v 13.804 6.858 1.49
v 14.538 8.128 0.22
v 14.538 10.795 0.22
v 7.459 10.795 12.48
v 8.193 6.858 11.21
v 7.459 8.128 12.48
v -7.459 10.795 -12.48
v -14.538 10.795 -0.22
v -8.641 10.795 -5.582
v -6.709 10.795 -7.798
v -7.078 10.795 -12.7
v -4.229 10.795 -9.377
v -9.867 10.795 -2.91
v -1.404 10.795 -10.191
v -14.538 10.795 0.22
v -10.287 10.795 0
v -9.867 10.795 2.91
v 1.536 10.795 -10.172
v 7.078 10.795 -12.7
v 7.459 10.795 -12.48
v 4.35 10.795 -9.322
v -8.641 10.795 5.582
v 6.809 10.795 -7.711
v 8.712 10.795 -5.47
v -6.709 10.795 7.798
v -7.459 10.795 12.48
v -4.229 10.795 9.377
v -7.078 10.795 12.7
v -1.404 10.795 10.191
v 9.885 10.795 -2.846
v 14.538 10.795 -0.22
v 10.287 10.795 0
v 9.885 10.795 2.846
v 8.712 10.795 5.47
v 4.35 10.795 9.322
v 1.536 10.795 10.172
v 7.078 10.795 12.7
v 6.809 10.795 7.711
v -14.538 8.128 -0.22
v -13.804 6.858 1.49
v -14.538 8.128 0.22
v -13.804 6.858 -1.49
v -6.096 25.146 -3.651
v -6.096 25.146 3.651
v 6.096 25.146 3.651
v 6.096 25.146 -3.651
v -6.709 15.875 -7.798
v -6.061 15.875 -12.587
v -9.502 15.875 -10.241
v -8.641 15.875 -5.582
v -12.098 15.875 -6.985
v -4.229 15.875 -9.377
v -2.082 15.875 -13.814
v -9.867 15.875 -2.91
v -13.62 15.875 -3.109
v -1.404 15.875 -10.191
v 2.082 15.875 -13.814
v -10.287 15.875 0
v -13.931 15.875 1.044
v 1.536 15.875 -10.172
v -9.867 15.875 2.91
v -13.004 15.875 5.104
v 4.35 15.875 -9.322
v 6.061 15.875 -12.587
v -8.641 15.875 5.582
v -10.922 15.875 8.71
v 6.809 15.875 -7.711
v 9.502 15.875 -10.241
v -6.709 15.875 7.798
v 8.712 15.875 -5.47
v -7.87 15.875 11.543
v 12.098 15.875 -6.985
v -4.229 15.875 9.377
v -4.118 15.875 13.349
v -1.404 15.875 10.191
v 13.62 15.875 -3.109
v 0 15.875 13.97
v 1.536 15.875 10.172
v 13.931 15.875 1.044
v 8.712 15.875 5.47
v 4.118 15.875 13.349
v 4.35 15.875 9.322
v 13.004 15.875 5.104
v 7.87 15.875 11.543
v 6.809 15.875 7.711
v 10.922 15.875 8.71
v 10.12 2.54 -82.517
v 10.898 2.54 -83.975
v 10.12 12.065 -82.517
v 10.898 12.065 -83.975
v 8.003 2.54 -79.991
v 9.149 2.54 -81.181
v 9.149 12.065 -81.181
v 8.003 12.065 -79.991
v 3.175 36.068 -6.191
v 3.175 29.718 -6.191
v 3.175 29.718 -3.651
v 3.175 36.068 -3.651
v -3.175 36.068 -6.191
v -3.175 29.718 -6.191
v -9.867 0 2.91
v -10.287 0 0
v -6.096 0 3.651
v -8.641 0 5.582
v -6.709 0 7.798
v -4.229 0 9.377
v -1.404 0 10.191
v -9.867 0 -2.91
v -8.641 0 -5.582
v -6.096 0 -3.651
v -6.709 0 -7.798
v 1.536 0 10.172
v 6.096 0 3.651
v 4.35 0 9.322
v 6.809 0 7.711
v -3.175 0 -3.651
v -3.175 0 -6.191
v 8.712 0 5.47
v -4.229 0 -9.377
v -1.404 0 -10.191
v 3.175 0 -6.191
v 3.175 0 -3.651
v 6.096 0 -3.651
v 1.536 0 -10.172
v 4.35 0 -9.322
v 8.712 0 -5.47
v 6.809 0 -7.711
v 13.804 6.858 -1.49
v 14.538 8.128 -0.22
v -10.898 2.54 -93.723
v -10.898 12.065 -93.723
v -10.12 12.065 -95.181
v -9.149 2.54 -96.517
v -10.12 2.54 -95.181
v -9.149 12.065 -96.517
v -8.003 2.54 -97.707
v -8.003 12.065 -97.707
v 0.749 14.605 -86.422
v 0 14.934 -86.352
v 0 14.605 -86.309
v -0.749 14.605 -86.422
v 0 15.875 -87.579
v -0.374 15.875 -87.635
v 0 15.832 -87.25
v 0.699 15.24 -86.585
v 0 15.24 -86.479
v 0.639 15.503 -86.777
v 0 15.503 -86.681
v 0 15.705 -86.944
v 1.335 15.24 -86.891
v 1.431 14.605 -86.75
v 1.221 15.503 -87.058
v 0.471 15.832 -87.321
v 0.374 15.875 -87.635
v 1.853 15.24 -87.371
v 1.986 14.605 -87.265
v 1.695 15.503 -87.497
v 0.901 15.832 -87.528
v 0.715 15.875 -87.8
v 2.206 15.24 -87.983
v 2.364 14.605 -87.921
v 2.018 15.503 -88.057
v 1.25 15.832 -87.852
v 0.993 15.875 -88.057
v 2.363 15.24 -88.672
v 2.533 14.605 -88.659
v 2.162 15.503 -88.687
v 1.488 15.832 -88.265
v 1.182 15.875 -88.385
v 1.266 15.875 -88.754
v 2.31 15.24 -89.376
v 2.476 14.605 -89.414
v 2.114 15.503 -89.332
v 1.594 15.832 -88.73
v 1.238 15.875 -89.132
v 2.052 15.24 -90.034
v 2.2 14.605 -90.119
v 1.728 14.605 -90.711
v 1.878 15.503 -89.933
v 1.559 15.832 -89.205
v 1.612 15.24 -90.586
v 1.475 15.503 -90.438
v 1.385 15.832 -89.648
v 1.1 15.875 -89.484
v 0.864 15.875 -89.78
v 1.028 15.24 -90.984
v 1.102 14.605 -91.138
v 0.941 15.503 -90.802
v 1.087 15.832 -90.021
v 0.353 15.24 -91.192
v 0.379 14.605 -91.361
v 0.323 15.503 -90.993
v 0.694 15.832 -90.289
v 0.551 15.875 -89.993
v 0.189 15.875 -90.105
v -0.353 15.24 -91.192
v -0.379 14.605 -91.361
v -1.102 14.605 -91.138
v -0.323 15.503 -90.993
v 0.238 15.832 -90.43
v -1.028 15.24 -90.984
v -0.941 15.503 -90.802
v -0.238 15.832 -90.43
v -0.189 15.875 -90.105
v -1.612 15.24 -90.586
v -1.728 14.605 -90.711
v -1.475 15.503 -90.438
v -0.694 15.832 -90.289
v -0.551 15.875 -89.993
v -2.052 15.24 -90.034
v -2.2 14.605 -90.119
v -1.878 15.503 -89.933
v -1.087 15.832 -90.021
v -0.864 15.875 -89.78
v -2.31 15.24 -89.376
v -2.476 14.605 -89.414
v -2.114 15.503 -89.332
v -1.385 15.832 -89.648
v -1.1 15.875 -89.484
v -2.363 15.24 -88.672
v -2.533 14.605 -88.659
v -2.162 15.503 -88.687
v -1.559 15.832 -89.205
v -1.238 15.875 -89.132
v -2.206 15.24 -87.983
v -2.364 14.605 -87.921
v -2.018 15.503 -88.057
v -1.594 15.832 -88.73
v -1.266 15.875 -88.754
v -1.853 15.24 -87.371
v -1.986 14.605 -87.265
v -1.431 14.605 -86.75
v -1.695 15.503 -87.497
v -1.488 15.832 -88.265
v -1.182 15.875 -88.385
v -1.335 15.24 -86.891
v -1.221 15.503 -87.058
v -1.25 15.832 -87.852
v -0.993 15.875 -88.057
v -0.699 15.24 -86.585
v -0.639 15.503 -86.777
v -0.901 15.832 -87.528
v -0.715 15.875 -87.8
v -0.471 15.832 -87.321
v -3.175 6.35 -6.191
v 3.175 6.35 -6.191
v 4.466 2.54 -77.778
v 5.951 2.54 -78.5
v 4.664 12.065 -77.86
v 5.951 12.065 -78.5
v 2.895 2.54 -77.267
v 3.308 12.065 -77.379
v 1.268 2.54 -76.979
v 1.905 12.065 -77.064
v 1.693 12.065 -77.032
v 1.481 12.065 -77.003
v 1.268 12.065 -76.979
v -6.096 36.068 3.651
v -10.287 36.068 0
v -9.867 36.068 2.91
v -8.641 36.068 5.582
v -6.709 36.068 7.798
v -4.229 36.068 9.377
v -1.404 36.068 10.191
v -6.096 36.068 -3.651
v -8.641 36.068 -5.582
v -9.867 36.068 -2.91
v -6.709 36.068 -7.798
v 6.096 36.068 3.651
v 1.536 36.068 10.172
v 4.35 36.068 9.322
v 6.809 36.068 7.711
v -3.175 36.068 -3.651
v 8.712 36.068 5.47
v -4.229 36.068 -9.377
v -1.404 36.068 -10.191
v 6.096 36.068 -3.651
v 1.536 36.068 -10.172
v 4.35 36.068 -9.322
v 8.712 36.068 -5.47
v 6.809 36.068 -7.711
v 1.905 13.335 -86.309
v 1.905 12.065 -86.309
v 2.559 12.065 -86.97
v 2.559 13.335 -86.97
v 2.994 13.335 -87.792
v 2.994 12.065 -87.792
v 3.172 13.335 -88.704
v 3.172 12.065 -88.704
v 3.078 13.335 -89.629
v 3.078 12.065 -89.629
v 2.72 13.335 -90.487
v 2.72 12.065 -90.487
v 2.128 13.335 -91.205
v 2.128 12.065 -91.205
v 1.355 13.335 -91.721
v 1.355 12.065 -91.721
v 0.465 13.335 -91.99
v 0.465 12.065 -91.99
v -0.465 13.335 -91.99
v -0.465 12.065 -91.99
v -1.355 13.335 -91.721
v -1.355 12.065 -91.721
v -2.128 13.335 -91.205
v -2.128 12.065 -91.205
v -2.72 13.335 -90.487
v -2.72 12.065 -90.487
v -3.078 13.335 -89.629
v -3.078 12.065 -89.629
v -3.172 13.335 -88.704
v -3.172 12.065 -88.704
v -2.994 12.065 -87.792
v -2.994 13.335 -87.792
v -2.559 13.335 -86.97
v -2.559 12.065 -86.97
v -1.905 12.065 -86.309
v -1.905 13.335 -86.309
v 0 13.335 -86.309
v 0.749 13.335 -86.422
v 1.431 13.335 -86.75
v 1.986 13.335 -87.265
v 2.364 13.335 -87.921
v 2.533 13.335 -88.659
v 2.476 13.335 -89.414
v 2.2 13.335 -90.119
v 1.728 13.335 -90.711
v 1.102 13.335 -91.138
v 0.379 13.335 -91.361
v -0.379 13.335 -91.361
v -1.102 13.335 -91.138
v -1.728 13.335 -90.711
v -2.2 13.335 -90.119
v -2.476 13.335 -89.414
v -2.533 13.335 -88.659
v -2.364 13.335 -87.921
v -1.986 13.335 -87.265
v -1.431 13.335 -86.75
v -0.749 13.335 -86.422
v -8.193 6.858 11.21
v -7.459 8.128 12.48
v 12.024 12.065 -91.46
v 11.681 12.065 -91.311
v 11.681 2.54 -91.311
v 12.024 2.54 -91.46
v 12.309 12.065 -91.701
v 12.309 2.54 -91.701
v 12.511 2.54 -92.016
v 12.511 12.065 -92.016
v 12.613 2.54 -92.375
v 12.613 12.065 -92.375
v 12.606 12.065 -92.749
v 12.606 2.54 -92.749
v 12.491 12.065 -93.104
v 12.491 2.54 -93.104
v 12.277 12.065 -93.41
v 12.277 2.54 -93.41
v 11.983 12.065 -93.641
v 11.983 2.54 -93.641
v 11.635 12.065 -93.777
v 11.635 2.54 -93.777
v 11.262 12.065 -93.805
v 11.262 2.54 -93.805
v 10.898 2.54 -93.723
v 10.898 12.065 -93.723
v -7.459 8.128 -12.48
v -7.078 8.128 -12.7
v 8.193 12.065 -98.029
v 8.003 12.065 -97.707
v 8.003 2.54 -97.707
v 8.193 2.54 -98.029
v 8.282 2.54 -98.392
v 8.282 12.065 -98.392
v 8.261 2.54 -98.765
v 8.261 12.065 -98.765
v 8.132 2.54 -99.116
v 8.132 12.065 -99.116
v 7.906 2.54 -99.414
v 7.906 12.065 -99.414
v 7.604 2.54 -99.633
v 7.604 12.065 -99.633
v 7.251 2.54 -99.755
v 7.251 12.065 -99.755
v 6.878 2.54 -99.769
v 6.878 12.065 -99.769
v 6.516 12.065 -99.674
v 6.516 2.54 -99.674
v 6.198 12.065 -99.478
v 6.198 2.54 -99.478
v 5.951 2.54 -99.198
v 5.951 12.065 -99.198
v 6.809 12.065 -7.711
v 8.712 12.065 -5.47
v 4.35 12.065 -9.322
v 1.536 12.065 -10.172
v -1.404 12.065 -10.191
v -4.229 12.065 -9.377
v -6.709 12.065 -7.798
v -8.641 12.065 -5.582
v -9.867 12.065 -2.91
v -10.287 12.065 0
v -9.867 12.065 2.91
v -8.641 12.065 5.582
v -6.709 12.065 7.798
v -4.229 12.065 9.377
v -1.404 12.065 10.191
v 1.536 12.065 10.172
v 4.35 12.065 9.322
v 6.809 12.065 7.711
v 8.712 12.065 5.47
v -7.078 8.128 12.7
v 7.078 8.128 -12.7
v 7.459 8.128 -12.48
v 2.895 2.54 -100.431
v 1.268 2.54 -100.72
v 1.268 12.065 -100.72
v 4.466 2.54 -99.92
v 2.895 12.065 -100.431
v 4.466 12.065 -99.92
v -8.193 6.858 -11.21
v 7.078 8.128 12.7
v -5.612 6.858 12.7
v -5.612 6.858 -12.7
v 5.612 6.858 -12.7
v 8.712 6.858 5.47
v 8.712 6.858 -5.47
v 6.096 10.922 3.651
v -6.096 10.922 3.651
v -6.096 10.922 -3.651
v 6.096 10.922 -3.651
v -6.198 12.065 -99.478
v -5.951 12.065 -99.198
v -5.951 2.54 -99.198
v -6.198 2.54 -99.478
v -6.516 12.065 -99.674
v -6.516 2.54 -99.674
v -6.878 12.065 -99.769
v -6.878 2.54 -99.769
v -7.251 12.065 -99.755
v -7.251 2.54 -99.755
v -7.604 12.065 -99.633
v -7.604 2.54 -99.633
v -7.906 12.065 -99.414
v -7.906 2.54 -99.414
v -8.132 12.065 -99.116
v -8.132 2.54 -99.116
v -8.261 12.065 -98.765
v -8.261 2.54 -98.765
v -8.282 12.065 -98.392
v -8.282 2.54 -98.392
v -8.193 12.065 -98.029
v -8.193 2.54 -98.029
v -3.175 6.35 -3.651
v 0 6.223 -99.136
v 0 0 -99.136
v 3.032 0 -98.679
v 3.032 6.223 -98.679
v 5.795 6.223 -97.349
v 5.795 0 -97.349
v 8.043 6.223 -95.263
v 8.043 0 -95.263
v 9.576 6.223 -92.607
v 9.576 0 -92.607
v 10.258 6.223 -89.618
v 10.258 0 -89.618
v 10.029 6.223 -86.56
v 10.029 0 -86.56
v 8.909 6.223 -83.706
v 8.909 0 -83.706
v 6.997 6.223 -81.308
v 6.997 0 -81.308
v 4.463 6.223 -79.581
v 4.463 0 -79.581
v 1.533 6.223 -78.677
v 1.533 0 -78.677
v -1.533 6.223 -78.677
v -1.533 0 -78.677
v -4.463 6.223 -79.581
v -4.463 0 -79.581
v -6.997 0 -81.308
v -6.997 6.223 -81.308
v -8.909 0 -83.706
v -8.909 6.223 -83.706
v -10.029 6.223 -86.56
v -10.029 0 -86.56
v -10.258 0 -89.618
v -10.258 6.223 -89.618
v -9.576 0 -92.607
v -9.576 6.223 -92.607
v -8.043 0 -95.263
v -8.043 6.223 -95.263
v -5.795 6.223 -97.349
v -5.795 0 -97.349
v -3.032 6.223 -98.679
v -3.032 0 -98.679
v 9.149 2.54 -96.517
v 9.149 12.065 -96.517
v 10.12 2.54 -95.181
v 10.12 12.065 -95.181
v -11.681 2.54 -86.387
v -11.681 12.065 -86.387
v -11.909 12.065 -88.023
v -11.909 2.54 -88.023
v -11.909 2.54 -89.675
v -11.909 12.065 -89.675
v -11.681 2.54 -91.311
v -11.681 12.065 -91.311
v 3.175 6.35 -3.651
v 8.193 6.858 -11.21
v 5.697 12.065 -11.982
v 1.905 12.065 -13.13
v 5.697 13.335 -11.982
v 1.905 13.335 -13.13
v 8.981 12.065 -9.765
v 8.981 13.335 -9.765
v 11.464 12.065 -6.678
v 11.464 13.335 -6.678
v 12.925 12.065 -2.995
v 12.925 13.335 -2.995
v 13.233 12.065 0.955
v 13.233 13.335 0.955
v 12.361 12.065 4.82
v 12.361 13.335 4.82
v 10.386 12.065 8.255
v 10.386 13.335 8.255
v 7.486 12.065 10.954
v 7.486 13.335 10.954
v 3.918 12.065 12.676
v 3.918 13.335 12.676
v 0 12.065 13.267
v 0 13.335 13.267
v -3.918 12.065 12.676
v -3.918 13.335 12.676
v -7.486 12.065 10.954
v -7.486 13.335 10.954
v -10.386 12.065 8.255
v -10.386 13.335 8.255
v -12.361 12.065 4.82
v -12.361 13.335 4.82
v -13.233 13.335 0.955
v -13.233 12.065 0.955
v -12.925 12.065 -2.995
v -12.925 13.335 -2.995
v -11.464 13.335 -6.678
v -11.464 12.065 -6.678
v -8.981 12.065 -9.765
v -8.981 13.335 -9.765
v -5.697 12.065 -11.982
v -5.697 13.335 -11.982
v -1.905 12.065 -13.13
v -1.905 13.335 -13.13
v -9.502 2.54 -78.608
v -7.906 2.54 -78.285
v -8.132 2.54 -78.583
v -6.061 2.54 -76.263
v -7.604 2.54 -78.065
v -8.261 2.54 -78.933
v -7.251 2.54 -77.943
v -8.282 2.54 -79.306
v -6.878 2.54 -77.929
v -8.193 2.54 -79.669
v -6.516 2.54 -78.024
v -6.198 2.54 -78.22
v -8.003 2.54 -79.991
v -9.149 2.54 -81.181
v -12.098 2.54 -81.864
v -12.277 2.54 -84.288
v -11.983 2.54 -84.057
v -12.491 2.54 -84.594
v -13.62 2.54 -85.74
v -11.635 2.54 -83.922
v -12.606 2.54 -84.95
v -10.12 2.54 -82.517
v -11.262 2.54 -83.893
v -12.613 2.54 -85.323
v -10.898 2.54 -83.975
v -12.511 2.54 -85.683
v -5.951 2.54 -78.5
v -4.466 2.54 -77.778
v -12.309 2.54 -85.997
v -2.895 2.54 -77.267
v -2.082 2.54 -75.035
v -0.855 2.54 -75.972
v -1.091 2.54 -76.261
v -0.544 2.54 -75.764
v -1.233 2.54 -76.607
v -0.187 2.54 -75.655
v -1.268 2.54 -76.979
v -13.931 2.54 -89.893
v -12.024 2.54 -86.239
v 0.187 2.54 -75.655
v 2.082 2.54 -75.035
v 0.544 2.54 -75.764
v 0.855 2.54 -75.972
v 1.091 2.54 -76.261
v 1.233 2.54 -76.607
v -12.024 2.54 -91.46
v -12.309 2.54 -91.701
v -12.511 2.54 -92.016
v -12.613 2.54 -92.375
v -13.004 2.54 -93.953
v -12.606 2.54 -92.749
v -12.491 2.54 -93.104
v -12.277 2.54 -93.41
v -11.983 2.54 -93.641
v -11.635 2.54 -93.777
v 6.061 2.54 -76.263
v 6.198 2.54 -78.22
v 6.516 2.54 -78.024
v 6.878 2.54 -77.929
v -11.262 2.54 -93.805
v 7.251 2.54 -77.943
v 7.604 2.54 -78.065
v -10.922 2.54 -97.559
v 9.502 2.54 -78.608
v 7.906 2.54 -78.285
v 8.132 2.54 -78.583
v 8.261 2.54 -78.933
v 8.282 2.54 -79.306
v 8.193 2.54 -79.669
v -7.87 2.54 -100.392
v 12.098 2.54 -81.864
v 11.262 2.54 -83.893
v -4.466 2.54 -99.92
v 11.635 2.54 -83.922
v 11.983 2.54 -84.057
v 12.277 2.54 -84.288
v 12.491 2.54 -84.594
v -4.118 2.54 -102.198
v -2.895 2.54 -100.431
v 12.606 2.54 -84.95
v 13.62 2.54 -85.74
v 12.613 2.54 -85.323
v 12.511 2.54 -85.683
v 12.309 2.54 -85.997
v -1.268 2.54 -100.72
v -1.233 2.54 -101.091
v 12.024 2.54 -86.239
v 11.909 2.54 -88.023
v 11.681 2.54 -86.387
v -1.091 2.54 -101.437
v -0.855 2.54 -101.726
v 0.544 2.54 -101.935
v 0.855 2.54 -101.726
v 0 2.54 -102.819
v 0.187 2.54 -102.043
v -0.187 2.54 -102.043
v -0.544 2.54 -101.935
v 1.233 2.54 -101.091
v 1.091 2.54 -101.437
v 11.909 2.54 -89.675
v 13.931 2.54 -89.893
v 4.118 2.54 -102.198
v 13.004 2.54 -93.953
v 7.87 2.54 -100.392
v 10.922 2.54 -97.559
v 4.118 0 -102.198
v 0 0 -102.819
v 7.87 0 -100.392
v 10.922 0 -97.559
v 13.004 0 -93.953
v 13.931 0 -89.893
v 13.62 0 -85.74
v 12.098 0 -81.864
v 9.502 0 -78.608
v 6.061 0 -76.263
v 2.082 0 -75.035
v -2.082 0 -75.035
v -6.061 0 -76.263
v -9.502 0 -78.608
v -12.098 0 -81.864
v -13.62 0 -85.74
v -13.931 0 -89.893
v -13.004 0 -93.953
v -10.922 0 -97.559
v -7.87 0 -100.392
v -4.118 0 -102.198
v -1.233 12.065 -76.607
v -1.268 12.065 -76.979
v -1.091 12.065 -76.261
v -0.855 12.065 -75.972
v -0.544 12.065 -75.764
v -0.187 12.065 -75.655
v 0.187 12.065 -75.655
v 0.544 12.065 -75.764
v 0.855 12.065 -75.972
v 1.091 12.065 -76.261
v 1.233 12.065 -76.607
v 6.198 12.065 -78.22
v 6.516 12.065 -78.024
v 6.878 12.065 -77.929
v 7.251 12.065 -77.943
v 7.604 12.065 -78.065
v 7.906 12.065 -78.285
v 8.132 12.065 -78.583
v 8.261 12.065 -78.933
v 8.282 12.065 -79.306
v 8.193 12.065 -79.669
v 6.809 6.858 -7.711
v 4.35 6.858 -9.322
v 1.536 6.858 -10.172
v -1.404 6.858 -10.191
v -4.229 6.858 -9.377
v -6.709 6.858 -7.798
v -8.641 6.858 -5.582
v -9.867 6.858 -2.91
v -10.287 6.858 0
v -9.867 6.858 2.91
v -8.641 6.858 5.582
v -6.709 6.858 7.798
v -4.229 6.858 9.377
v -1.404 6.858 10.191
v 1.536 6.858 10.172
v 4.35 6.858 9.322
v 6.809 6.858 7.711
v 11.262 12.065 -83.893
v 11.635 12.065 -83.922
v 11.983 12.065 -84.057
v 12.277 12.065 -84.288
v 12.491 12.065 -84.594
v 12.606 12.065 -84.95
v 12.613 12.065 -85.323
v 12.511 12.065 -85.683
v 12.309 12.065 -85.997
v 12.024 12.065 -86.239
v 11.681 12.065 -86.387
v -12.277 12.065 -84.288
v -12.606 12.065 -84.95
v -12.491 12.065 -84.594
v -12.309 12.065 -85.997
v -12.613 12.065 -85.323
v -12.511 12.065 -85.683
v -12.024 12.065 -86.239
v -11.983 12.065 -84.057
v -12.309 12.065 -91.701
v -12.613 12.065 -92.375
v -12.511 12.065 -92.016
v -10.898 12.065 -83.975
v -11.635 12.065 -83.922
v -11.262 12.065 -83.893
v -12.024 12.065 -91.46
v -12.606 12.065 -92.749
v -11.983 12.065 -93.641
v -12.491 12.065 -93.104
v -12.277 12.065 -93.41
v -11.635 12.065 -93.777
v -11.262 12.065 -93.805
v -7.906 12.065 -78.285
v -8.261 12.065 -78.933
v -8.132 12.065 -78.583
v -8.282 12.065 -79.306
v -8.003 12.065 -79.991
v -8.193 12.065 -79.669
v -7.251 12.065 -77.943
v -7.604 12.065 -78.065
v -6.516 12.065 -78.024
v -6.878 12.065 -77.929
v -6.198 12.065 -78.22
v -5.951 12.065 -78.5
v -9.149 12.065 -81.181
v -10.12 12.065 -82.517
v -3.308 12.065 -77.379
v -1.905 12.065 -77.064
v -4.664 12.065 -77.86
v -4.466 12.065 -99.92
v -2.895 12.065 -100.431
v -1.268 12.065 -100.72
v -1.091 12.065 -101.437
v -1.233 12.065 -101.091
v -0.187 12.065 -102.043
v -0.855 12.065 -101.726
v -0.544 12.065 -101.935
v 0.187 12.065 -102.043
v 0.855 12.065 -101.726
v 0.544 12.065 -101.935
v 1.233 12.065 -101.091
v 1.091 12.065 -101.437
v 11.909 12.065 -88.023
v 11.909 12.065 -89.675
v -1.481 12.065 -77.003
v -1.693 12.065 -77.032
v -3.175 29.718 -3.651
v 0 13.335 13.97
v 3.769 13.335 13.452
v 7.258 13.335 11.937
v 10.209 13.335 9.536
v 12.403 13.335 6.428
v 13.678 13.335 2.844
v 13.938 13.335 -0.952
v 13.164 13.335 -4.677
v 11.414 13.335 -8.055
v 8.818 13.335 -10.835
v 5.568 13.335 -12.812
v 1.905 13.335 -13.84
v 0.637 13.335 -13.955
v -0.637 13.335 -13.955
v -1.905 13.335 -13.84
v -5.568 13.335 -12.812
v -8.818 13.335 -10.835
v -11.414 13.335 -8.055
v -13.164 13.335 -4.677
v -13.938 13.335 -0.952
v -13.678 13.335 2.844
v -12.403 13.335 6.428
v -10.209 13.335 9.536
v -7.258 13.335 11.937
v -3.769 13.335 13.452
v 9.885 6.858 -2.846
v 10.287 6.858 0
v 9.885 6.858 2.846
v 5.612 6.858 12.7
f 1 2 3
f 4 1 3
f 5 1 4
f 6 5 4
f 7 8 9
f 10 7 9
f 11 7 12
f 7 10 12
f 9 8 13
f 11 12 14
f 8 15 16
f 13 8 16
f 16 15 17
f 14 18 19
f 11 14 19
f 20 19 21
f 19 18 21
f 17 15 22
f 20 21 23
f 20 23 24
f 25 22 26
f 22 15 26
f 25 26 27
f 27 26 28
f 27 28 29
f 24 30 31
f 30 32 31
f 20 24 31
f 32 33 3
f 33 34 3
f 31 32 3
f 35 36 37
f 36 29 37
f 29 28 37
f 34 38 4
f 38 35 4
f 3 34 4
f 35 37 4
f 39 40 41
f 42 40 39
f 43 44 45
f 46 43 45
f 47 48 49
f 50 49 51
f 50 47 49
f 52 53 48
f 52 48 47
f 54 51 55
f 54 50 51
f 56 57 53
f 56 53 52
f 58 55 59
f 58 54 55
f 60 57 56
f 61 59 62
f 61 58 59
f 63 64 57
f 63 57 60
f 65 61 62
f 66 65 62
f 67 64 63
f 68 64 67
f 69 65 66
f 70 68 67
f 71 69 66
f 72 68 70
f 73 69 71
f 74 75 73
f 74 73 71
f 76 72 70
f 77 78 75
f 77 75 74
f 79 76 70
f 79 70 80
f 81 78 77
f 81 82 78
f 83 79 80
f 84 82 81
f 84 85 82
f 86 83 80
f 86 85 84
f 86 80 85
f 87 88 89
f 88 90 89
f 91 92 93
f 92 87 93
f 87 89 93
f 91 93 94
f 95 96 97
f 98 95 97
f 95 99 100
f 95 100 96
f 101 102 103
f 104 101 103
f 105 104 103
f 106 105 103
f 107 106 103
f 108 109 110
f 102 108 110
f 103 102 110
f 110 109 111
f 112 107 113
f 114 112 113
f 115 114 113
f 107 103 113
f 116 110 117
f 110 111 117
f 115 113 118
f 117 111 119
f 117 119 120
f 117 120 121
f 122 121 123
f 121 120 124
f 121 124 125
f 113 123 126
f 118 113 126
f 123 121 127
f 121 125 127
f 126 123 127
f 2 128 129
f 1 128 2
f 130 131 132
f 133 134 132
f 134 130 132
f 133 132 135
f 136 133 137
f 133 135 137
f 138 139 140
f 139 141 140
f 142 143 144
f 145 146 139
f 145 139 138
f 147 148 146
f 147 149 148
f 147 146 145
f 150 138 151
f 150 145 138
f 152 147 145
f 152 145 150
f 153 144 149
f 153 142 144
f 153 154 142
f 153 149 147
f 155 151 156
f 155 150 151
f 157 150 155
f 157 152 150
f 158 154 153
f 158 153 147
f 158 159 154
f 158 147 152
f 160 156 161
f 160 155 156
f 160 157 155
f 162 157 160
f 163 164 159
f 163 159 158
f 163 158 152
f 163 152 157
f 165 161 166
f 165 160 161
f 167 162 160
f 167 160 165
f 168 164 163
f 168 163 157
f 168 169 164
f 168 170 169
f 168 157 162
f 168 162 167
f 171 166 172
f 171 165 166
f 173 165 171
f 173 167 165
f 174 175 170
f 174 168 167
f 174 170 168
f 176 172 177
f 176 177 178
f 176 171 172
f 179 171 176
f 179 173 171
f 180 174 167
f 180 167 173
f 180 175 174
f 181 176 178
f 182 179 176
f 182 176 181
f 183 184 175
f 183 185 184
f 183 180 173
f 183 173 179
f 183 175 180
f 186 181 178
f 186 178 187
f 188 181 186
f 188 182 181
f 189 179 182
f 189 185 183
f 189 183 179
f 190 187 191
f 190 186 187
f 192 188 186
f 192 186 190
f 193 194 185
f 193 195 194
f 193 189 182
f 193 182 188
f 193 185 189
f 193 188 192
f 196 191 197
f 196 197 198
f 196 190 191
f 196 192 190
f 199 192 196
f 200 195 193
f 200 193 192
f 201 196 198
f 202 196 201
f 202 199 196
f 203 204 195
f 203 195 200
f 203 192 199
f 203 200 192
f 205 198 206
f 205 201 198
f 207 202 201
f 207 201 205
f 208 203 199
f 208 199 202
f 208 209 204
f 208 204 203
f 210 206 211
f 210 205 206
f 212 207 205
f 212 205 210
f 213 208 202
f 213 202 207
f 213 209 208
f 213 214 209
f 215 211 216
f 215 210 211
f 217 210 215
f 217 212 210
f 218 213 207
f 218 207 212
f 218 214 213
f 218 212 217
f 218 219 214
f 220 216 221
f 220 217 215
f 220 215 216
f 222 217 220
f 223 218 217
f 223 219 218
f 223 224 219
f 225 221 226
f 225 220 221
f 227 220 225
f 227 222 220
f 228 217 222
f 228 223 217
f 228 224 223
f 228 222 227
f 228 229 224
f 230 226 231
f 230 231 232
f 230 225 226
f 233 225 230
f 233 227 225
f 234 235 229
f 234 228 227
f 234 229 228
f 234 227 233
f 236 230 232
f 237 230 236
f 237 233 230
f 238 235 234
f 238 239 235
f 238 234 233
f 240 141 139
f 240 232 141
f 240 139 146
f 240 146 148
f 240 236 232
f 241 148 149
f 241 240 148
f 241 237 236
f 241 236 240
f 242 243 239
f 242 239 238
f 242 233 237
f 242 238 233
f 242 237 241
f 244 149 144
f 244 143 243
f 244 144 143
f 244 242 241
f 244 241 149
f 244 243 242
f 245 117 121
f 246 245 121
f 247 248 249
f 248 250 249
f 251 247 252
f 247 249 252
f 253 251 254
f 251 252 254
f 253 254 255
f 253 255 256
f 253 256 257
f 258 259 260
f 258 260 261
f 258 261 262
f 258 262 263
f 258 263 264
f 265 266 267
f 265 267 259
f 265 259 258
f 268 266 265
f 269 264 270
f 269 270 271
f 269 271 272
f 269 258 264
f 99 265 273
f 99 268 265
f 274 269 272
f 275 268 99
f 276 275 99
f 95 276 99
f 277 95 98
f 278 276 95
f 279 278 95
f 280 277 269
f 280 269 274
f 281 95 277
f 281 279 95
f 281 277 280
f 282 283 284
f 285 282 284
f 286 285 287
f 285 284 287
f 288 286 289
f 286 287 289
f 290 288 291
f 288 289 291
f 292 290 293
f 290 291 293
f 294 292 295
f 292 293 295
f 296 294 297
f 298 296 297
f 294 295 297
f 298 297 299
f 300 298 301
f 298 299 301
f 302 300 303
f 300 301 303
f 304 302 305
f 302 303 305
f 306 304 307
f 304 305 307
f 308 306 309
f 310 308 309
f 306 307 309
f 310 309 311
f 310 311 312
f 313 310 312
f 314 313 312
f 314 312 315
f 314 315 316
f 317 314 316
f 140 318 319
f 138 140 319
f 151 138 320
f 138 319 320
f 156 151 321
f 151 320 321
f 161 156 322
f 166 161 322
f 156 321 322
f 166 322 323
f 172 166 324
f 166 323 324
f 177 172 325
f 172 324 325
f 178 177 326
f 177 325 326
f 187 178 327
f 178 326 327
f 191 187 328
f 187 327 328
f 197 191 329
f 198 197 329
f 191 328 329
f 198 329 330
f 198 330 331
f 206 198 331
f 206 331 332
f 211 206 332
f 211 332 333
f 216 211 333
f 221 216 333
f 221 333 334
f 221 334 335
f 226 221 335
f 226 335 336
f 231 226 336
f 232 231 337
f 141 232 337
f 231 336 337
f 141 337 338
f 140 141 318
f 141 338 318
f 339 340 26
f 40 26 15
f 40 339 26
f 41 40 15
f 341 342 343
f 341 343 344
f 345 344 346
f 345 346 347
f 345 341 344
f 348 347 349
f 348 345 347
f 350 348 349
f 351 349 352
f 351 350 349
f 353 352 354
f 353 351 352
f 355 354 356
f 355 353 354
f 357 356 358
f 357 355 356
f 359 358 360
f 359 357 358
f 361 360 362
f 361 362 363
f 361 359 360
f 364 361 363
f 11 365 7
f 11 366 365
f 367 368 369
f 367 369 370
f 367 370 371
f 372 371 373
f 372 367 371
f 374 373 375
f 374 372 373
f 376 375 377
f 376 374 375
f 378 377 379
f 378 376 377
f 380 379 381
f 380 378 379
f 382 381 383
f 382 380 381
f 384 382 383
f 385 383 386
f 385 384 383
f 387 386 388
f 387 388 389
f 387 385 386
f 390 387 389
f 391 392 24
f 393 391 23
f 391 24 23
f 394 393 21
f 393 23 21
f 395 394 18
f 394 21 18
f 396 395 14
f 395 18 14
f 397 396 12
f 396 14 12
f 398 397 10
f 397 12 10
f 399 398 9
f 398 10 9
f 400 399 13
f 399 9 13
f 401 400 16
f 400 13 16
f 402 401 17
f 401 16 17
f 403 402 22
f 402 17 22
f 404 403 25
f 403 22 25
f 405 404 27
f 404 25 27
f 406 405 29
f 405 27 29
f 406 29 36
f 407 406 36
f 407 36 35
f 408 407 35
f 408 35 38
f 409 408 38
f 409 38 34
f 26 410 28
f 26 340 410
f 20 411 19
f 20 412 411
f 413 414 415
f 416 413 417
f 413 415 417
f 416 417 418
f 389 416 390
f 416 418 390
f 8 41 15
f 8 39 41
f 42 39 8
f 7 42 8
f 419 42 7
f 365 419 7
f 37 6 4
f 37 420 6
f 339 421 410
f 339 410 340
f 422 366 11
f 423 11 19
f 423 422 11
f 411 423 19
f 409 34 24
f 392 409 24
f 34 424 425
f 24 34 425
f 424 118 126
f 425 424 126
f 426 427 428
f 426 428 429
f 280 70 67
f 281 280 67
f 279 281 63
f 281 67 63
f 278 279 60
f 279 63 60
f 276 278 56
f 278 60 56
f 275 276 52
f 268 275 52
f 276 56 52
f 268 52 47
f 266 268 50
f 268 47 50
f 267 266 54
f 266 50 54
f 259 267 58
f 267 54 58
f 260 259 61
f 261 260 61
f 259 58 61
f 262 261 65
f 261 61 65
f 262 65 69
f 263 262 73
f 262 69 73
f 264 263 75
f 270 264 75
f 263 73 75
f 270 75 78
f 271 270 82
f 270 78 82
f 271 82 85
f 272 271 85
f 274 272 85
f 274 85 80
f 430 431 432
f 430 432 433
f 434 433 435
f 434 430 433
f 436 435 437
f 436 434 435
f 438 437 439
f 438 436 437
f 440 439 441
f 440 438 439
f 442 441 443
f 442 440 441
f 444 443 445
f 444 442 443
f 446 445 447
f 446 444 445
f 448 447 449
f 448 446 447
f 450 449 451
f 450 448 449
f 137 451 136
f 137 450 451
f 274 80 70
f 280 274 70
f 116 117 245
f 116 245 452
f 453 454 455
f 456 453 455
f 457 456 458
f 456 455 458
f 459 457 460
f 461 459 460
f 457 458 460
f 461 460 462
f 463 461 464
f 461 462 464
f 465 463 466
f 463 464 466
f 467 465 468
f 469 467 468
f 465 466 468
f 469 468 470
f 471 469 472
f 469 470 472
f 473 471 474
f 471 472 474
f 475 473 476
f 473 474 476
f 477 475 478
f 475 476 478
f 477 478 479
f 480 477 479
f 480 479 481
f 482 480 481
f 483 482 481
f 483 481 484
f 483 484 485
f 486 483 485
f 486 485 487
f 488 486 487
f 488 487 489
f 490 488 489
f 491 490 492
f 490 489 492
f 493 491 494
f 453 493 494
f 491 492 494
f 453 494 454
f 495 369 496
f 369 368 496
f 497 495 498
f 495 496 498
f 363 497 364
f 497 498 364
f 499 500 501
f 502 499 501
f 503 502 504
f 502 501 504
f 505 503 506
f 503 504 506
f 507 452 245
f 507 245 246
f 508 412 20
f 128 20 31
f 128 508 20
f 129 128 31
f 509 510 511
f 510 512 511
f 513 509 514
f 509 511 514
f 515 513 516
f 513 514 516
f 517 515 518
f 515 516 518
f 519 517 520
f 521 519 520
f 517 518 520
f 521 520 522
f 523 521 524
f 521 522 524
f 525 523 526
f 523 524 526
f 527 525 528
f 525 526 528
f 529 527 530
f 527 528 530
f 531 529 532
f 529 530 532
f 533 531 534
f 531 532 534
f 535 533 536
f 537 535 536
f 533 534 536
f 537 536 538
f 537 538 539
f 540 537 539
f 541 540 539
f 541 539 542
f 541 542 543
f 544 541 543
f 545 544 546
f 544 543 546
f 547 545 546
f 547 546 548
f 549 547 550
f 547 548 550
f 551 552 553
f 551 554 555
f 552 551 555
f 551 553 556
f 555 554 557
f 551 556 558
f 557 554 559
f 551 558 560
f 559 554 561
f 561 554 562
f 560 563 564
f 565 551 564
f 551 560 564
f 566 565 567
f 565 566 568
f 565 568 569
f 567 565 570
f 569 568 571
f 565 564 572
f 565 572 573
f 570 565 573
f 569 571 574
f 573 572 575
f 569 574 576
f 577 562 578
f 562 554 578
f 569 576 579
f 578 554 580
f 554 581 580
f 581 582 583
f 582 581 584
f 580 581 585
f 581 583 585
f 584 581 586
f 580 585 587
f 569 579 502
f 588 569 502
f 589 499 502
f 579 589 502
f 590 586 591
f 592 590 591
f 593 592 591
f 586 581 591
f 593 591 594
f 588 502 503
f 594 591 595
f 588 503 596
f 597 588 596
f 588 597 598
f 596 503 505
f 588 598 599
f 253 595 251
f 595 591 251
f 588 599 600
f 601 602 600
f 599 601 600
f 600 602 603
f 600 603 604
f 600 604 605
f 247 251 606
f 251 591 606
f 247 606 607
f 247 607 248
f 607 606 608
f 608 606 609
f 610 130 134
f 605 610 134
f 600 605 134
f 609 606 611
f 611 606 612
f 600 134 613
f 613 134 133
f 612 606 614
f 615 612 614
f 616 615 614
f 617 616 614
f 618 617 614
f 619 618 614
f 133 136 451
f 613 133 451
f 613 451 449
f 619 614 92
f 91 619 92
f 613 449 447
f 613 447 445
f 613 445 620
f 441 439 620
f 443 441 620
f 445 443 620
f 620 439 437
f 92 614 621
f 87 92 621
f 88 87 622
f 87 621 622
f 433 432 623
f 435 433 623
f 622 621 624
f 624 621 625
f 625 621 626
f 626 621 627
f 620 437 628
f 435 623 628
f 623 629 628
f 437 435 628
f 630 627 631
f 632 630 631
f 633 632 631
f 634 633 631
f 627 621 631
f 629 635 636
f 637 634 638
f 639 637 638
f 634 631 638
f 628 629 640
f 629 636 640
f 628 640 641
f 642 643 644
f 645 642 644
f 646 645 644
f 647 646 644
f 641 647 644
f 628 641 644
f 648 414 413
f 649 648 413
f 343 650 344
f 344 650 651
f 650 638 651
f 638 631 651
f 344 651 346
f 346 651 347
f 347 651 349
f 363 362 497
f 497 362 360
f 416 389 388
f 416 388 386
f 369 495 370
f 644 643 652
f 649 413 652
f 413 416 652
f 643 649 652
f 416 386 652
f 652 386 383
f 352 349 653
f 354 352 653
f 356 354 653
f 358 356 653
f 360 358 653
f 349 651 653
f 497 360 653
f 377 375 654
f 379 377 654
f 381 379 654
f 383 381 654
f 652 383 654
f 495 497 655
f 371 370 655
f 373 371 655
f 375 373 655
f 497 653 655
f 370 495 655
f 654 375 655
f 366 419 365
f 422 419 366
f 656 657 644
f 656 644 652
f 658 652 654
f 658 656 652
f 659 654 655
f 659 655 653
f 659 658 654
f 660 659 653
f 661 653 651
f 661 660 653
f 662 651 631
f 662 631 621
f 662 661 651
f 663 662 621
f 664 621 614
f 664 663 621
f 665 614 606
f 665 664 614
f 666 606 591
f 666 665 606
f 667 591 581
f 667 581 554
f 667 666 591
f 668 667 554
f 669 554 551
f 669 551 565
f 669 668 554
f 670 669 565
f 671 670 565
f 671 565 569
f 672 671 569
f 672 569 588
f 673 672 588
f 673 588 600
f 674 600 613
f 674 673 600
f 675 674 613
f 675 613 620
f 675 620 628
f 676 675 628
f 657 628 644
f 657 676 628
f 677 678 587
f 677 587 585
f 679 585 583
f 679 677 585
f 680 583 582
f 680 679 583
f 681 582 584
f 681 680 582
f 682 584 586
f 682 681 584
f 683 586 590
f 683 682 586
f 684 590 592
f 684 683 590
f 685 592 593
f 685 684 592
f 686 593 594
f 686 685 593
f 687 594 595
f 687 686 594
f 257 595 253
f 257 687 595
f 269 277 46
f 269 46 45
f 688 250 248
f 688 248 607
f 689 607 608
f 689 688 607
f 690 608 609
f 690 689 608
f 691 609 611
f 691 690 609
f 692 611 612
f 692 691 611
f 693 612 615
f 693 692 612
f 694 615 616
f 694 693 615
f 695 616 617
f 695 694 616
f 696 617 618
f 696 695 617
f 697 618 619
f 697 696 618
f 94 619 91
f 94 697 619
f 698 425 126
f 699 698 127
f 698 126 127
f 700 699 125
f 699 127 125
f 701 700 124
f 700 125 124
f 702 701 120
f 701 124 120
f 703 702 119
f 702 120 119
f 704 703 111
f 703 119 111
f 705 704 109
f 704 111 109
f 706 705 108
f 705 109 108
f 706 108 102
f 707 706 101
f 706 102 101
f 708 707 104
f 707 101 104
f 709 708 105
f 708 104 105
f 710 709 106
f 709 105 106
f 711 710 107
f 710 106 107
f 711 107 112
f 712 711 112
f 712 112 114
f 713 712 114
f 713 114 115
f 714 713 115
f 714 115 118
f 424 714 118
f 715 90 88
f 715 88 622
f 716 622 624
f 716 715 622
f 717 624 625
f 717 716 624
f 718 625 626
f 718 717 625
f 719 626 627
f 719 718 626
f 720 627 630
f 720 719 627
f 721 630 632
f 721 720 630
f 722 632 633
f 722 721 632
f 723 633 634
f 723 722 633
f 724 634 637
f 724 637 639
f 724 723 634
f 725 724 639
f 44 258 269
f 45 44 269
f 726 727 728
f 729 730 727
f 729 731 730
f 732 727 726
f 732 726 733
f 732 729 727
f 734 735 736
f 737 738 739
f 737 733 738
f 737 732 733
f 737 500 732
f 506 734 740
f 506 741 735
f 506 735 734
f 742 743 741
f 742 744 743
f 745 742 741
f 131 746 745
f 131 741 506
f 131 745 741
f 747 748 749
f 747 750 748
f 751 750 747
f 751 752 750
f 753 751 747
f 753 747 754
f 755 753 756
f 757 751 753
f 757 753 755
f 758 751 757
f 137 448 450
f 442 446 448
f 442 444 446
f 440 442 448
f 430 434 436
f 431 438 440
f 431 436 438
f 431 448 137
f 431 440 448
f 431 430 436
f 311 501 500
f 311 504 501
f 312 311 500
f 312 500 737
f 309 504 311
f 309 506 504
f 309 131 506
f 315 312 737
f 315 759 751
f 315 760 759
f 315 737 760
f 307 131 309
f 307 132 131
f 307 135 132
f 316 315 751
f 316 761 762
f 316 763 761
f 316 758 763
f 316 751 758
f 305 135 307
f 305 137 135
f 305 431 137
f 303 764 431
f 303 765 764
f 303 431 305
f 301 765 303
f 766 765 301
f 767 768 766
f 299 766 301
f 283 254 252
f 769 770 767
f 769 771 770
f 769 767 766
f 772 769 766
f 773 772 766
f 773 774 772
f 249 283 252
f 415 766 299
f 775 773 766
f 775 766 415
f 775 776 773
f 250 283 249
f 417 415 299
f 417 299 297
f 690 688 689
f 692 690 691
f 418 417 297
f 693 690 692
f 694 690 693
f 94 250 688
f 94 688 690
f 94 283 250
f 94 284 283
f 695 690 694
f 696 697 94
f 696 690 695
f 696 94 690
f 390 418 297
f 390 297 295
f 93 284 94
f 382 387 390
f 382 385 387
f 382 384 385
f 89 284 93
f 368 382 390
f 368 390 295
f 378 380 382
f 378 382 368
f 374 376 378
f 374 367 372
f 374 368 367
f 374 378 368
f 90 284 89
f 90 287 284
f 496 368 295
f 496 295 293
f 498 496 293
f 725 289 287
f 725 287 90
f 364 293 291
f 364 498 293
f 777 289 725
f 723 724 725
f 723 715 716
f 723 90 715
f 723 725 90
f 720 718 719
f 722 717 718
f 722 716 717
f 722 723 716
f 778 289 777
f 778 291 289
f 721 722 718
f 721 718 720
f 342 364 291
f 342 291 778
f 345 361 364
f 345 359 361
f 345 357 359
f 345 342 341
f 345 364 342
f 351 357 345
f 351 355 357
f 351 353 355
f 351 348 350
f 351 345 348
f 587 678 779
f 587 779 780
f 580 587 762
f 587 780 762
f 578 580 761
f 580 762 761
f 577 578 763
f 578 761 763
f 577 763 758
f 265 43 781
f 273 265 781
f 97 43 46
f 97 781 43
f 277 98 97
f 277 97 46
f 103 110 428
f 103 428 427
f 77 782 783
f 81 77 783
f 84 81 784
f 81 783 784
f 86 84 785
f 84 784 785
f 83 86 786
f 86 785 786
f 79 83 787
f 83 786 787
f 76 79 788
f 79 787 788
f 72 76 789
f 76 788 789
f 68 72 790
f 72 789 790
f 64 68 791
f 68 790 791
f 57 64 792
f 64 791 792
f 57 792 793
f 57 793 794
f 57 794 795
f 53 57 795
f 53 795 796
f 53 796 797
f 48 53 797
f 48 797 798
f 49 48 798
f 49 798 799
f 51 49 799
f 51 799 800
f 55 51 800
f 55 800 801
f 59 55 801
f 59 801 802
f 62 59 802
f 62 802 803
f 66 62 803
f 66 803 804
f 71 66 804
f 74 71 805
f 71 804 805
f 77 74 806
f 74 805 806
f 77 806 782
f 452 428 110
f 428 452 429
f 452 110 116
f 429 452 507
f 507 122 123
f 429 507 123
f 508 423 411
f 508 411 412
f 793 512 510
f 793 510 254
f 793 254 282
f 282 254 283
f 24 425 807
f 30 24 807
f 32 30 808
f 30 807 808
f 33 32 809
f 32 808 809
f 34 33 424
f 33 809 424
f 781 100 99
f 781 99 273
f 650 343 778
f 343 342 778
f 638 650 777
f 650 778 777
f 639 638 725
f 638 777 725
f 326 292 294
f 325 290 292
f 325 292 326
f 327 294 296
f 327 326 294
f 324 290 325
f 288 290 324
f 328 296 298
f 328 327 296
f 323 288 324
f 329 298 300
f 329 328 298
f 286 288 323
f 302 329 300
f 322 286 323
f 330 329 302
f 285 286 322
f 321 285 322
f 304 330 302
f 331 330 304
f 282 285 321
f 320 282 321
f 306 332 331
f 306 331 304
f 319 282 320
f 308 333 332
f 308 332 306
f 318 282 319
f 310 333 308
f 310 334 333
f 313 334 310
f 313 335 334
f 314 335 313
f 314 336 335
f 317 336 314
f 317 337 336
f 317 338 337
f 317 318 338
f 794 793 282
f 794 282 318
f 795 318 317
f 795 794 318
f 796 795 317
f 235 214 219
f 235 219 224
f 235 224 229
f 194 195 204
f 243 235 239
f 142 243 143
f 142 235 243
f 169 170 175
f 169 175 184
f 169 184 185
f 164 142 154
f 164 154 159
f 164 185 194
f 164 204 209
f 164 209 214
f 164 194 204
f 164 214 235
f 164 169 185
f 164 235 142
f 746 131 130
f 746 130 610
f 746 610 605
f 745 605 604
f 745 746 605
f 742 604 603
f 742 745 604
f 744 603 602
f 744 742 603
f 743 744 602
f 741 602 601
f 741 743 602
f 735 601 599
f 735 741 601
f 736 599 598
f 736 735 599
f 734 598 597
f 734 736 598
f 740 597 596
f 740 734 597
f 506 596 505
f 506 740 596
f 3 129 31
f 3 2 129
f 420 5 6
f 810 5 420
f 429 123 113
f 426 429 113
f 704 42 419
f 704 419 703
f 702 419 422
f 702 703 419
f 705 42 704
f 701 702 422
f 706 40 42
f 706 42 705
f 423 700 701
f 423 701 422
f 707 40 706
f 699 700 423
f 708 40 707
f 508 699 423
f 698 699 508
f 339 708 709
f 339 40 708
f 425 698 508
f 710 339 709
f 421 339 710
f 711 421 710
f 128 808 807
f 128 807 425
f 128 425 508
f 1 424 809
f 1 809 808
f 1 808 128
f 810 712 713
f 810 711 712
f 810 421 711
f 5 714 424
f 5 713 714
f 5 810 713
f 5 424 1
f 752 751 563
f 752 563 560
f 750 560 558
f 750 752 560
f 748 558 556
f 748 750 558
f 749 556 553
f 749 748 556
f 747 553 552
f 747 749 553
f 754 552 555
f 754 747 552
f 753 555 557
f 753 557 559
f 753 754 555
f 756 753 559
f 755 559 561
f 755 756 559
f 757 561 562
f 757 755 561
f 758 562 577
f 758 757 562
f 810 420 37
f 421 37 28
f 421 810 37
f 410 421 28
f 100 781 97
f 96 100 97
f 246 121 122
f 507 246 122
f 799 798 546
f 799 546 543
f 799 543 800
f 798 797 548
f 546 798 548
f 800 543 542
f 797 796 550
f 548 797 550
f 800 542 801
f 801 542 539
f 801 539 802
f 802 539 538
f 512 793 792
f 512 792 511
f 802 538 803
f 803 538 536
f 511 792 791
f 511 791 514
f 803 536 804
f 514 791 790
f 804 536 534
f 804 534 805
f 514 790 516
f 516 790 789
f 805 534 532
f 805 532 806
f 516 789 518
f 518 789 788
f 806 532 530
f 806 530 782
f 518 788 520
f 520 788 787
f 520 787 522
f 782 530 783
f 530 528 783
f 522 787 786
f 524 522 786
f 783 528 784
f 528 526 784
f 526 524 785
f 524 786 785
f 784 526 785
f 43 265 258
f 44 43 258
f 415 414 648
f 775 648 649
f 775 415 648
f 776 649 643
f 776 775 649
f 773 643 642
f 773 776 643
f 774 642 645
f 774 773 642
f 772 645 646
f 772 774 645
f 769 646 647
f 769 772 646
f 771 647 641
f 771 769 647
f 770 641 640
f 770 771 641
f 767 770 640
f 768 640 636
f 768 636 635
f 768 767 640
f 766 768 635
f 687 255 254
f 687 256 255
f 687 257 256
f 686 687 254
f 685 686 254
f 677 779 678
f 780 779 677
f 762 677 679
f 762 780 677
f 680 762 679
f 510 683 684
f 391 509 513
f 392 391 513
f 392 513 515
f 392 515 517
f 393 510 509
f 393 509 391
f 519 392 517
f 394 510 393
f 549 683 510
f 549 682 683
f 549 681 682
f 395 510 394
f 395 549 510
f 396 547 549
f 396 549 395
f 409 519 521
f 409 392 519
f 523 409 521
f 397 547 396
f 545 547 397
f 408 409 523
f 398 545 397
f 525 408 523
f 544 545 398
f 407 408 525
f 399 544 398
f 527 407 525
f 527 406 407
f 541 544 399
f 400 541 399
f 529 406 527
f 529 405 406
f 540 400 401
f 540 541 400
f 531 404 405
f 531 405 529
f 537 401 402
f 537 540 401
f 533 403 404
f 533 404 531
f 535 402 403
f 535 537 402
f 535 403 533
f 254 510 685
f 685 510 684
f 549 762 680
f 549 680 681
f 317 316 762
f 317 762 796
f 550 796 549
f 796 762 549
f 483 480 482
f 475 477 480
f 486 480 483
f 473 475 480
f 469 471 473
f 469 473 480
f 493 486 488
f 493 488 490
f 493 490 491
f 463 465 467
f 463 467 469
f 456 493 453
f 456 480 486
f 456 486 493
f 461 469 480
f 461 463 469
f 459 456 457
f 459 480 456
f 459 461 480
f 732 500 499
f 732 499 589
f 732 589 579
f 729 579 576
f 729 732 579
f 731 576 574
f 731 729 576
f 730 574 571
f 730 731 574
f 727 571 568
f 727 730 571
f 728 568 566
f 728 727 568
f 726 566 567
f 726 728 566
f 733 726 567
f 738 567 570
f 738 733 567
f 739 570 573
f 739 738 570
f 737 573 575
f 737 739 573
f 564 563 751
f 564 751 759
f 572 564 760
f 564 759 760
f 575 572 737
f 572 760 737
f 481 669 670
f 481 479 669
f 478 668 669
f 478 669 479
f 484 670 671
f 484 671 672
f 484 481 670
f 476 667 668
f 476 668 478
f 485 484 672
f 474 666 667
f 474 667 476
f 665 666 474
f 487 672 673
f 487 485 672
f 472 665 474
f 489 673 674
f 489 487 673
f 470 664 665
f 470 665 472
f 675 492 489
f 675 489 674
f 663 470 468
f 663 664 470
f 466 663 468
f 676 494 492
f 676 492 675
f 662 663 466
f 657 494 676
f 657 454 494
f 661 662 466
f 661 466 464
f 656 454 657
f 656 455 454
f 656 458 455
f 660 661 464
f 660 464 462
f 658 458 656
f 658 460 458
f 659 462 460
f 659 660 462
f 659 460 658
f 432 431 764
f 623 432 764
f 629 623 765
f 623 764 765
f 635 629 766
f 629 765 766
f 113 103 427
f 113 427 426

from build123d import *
from OCP.BRepFilletAPI import BRepFilletAPI_MakeChamfer

# Parameters (mm, degrees)
BOSS_EXTRUDE1_DEPTH  = 13.335
SKETCH2_R            = 13.97
BOSS_EXTRUDE2_DEPTH  = 2.54
BOSS_EXTRUDE3_DEPTH  = 36.068
BOSS_EXTRUDE4_START  = 6.477
SKETCH3_R            = 10.287
BOSS_EXTRUDE4_DEPTH  = 3.937
CHAMFER1_SIZE        = 0.254
CHAMFER1_EDGE_2_SIZE = 0.254
CHAMFER1_EDGE_3_SIZE = 0.254
CHAMFER1_EDGE_4_SIZE = 0.254
CHAMFER1_EDGE_5_SIZE = 0.254
CHAMFER1_EDGE_6_SIZE = 0.254
SKETCH4_W            = 12.192
SKETCH4_H            = 7.3025
CUT_EXTRUDE1_DEPTH   = 10.922
SKETCH5_W            = 6.35
SKETCH5_H            = 2.54
CUT_EXTRUDE2_DEPTH   = 6.35
SKETCH6_R            = 13.267076916
BOSS_EXTRUDE5_DEPTH  = 1.27
BOSS_EXTRUDE6_DEPTH  = 1.27
SKETCH8_R            = 2.54
BOSS_EXTRUDE7_DEPTH  = 2.54
FILLET1_R            = 1.27
SKETCH9_R            = 11.938
BOSS_EXTRUDE8_DEPTH  = 12.065
SKETCH10_R           = 13.97
BOSS_EXTRUDE9_DEPTH  = 2.54
SKETCH11_R           = 10.287
CUT_EXTRUDE3_DEPTH   = 6.223
SKETCH12_R           = 1.27
BOSS_EXTRUDE10_DEPTH = 9.525
CIRPATTERN1_COUNT    = 10
CHAMFER2_SIZE        = 1.27
CHAMFER2_SIZE2       = 0.733234842


with BuildPart() as part:
    # Sketch1 → Boss-Extrude1 (new body)
    with BuildSketch(Plane(origin=(0, 0, 0), x_dir=(1, 0, 0), z_dir=(0, 1, 0))):
        with BuildLine():
            Line((8.7122, -5.469912263), (8.7122, 5.469912263))
            ThreePointArc((8.7122, 5.469912263), (-10.287, 0), (8.7122, -5.469912263))
        make_face()
    extrude(amount=BOSS_EXTRUDE1_DEPTH)

    # Sketch2 → Boss-Extrude2 (add)
    with BuildSketch(Plane(origin=(0, 13.335, 0), x_dir=(1, 0, 0), z_dir=(0, 1, 0))):
        with Locations(Location((0, 0, 0), (0, 0, 270))):
            Circle(SKETCH2_R)
    extrude(amount=BOSS_EXTRUDE2_DEPTH)

    # Sketch1<2> → Boss-Extrude3 (add)
    with BuildSketch(Plane(origin=(0, 0, 0), x_dir=(1, 0, 0), z_dir=(0, 1, 0))):
        with BuildLine():
            Line((8.7122, -5.469912263), (8.7122, 5.469912263))
            ThreePointArc((8.7122, 5.469912263), (-10.287, 0), (8.7122, -5.469912263))
        make_face()
    extrude(amount=BOSS_EXTRUDE3_DEPTH)

    # Sketch3 → Boss-Extrude4 (add)
    with BuildSketch(Plane.XZ.offset(-13.335).offset(BOSS_EXTRUDE4_START)):
        Polygon((7.332348419, 12.7), (-7.332348419, 12.7), (-14.664696837, 0), (-7.332348419, -12.7), (7.332348419, -12.7), (14.664696837, 0), align=None)
        Circle(SKETCH3_R, mode=Mode.SUBTRACT)
    extrude(amount=-BOSS_EXTRUDE4_DEPTH)

    # Chamfer1
    chamfer1_edges = [part.edges().sort_by_distance(p)[0] for p in [
        (14.664696837, 8.8265, 0),
    ]]
    chamfer(chamfer1_edges, length=CHAMFER1_SIZE)

    # Chamfer1 edge 2
    chamfer1_edge_2_edges = [part.edges().sort_by_distance(p)[0] for p in [
        (7.332348419, 8.8265, 12.7),
    ]]
    chamfer(chamfer1_edge_2_edges, length=CHAMFER1_EDGE_2_SIZE)

    # Chamfer1 edge 3
    chamfer1_edge_3_edges = [part.edges().sort_by_distance(p)[0] for p in [
        (-7.332348419, 8.8265, 12.7),
    ]]
    chamfer(chamfer1_edge_3_edges, length=CHAMFER1_EDGE_3_SIZE)

    # Chamfer1 edge 4
    chamfer1_edge_4_edges = [part.edges().sort_by_distance(p)[0] for p in [
        (-14.664696837, 8.8265, 0),
    ]]
    chamfer(chamfer1_edge_4_edges, length=CHAMFER1_EDGE_4_SIZE)

    # Chamfer1 edge 5
    chamfer1_edge_5_edges = [part.edges().sort_by_distance(p)[0] for p in [
        (-7.332348419, 8.8265, -12.7),
    ]]
    chamfer(chamfer1_edge_5_edges, length=CHAMFER1_EDGE_5_SIZE)

    # Chamfer1 edge 6
    chamfer1_edge_6_edges = [part.edges().sort_by_distance(p)[0] for p in [
        (7.332348419, 8.8265, -12.7),
    ]]
    chamfer(chamfer1_edge_6_edges, length=CHAMFER1_EDGE_6_SIZE)

    # Sketch4 → Cut-Extrude1 (cut)
    with BuildSketch(Plane.XZ):
        Rectangle(SKETCH4_W, SKETCH4_H)
    cut_extrude1 = extrude(amount=-CUT_EXTRUDE1_DEPTH, mode=Mode.SUBTRACT)

    # Sketch5 → Cut-Extrude2 (cut)
    with BuildSketch(Plane.XZ):
        with Locations((0, -4.92125)):
            Rectangle(SKETCH5_W, SKETCH5_H)
    cut_extrude2 = extrude(amount=-CUT_EXTRUDE2_DEPTH, mode=Mode.SUBTRACT)

    # Mirror1: Cut-Extrude1, Cut-Extrude2 across plane
    add(cut_extrude1.mirror(Plane(origin=(0, 18.034, 0), x_dir=(0, 0, 1), z_dir=(0, -1, 0))), mode=Mode.SUBTRACT)
    add(cut_extrude2.mirror(Plane(origin=(0, 18.034, 0), x_dir=(0, 0, 1), z_dir=(0, -1, 0))), mode=Mode.SUBTRACT)

    # Sketch6 → Boss-Extrude5 (add)
    with BuildSketch(Plane.XZ.offset(-13.335)):
        with Locations(Location((0, 0, 0), (0, 0, 90))):
            Circle(SKETCH6_R)
    extrude(amount=BOSS_EXTRUDE5_DEPTH)

    # Sketch7 → Boss-Extrude6 (add)
    with BuildSketch(Plane.XZ.offset(-12.065)):
        with BuildLine():
            Line((-1.905, -10.109072361), (1.905, -10.109072361))
            Line((1.905, -10.109072361), (1.905, -86.309072361))
            ThreePointArc((1.905, -86.309072361), (0, -92.024072361), (-1.905, -86.309072361))
            Line((-1.905, -86.309072361), (-1.905, -10.109072361))
        make_face()
    extrude(amount=-BOSS_EXTRUDE6_DEPTH)

    # Sketch8 → Boss-Extrude7 (add)
    with BuildSketch(Plane(origin=(0, 13.335, 0), x_dir=(1, 0, 0), z_dir=(0, 1, 0))):
        with Locations(Location((0, 88.849072361, 0), (0, 0, 270))):
            Circle(SKETCH8_R)
    extrude(amount=BOSS_EXTRUDE7_DEPTH)

    # Fillet1
    fillet1_edges = [part.edges().sort_by_distance(p)[0] for p in [
        (0, 15.875, -91.389072361),
    ]]
    fillet(fillet1_edges, radius=FILLET1_R)

    # Sketch9 → Boss-Extrude8 (add)
    with BuildSketch(Plane.XZ.offset(-12.065)):
        with Locations(Location((0, -88.849072361, 0), (0, 0, 99.182197699))):
            Circle(SKETCH9_R)
    extrude(amount=BOSS_EXTRUDE8_DEPTH)

    # Sketch10 → Boss-Extrude9 (add)
    with BuildSketch(Plane.XZ):
        with Locations(Location((0, -88.849072361, 0), (0, 0, 270))):
            Circle(SKETCH10_R)
    extrude(amount=-BOSS_EXTRUDE9_DEPTH)

    # Sketch11 → Cut-Extrude3 (cut)
    with BuildSketch(Plane.XZ):
        with Locations(Location((0, -88.849072361, 0), (0, 0, 270))):
            Circle(SKETCH11_R)
    extrude(amount=-CUT_EXTRUDE3_DEPTH, mode=Mode.SUBTRACT)

    # Sketch12 → Boss-Extrude10 (add)
    with BuildSketch(Plane(origin=(0, 12.065, 0), x_dir=(1, 0, 0), z_dir=(0, 1, 0))):
        with Locations((0, 100.787072361)):
            Circle(SKETCH12_R)
    boss_extrude10 = extrude(amount=-BOSS_EXTRUDE10_DEPTH)

    # CirPattern1: Boss-Extrude10 ×10 about axis
    cirpattern1_axis = Axis((0, 0, -88.849072361), (0, 1, 0))
    for i in range(1, CIRPATTERN1_COUNT):
        add(boss_extrude10.rotate(cirpattern1_axis, i * 360 / CIRPATTERN1_COUNT))

    # Chamfer2: one chamfer whose edges measure the first distance from different faces: ONE call of the kernel's chamfer builder (chamfer() names one face for all edges)
    chamfer2_edges_1 = [part.edges().sort_by_distance(p)[0] for p in [
        (7.268848419, 6.858, -12.590014774),
    ]]
    chamfer2_side_1 = [part.faces().sort_by_distance(p)[0] for p in [
        (7.268848419, 8.8265, -12.590014774),
    ]]
    chamfer2_edges_2 = [part.edges().sort_by_distance(p)[0] for p in [
        (-7.268848419, 6.858, -12.590014774),
    ]]
    chamfer2_side_2 = [part.faces().sort_by_distance(p)[0] for p in [
        (-7.268848419, 8.8265, -12.590014774),
    ]]
    chamfer2_edges_3 = [part.edges().sort_by_distance(p)[0] for p in [
        (-14.537696837, 6.858, 0),
    ]]
    chamfer2_side_3 = [part.faces().sort_by_distance(p)[0] for p in [
        (-14.537696837, 8.8265, 0),
    ]]
    chamfer2_edges_4 = [part.edges().sort_by_distance(p)[0] for p in [
        (-7.268848419, 6.858, 12.590014774),
    ]]
    chamfer2_side_4 = [part.faces().sort_by_distance(p)[0] for p in [
        (-7.268848419, 8.8265, 12.590014774),
    ]]
    chamfer2_edges_5 = [part.edges().sort_by_distance(p)[0] for p in [
        (7.268848419, 6.858, 12.590014774),
    ]]
    chamfer2_side_5 = [part.faces().sort_by_distance(p)[0] for p in [
        (7.268848419, 8.8265, 12.590014774),
    ]]
    chamfer2_edges_6 = [part.edges().sort_by_distance(p)[0] for p in [
        (14.537696837, 6.858, 0),
    ]]
    chamfer2_side_6 = [part.faces().sort_by_distance(p)[0] for p in [
        (14.537696837, 8.8265, 0),
    ]]
    chamfer2 = BRepFilletAPI_MakeChamfer(part.part.solid().wrapped)
    for e in chamfer2_edges_1:
        chamfer2.Add(CHAMFER2_SIZE, CHAMFER2_SIZE2, e.wrapped, chamfer2_side_1[0].wrapped)  # the first distance lies on this face
    for e in chamfer2_edges_2:
        chamfer2.Add(CHAMFER2_SIZE, CHAMFER2_SIZE2, e.wrapped, chamfer2_side_2[0].wrapped)  # the first distance lies on this face
    for e in chamfer2_edges_3:
        chamfer2.Add(CHAMFER2_SIZE, CHAMFER2_SIZE2, e.wrapped, chamfer2_side_3[0].wrapped)  # the first distance lies on this face
    for e in chamfer2_edges_4:
        chamfer2.Add(CHAMFER2_SIZE, CHAMFER2_SIZE2, e.wrapped, chamfer2_side_4[0].wrapped)  # the first distance lies on this face
    for e in chamfer2_edges_5:
        chamfer2.Add(CHAMFER2_SIZE, CHAMFER2_SIZE2, e.wrapped, chamfer2_side_5[0].wrapped)  # the first distance lies on this face
    for e in chamfer2_edges_6:
        chamfer2.Add(CHAMFER2_SIZE, CHAMFER2_SIZE2, e.wrapped, chamfer2_side_6[0].wrapped)  # the first distance lies on this face
    add(Compound.cast(chamfer2.Shape()), mode=Mode.REPLACE)


solid = part.part
